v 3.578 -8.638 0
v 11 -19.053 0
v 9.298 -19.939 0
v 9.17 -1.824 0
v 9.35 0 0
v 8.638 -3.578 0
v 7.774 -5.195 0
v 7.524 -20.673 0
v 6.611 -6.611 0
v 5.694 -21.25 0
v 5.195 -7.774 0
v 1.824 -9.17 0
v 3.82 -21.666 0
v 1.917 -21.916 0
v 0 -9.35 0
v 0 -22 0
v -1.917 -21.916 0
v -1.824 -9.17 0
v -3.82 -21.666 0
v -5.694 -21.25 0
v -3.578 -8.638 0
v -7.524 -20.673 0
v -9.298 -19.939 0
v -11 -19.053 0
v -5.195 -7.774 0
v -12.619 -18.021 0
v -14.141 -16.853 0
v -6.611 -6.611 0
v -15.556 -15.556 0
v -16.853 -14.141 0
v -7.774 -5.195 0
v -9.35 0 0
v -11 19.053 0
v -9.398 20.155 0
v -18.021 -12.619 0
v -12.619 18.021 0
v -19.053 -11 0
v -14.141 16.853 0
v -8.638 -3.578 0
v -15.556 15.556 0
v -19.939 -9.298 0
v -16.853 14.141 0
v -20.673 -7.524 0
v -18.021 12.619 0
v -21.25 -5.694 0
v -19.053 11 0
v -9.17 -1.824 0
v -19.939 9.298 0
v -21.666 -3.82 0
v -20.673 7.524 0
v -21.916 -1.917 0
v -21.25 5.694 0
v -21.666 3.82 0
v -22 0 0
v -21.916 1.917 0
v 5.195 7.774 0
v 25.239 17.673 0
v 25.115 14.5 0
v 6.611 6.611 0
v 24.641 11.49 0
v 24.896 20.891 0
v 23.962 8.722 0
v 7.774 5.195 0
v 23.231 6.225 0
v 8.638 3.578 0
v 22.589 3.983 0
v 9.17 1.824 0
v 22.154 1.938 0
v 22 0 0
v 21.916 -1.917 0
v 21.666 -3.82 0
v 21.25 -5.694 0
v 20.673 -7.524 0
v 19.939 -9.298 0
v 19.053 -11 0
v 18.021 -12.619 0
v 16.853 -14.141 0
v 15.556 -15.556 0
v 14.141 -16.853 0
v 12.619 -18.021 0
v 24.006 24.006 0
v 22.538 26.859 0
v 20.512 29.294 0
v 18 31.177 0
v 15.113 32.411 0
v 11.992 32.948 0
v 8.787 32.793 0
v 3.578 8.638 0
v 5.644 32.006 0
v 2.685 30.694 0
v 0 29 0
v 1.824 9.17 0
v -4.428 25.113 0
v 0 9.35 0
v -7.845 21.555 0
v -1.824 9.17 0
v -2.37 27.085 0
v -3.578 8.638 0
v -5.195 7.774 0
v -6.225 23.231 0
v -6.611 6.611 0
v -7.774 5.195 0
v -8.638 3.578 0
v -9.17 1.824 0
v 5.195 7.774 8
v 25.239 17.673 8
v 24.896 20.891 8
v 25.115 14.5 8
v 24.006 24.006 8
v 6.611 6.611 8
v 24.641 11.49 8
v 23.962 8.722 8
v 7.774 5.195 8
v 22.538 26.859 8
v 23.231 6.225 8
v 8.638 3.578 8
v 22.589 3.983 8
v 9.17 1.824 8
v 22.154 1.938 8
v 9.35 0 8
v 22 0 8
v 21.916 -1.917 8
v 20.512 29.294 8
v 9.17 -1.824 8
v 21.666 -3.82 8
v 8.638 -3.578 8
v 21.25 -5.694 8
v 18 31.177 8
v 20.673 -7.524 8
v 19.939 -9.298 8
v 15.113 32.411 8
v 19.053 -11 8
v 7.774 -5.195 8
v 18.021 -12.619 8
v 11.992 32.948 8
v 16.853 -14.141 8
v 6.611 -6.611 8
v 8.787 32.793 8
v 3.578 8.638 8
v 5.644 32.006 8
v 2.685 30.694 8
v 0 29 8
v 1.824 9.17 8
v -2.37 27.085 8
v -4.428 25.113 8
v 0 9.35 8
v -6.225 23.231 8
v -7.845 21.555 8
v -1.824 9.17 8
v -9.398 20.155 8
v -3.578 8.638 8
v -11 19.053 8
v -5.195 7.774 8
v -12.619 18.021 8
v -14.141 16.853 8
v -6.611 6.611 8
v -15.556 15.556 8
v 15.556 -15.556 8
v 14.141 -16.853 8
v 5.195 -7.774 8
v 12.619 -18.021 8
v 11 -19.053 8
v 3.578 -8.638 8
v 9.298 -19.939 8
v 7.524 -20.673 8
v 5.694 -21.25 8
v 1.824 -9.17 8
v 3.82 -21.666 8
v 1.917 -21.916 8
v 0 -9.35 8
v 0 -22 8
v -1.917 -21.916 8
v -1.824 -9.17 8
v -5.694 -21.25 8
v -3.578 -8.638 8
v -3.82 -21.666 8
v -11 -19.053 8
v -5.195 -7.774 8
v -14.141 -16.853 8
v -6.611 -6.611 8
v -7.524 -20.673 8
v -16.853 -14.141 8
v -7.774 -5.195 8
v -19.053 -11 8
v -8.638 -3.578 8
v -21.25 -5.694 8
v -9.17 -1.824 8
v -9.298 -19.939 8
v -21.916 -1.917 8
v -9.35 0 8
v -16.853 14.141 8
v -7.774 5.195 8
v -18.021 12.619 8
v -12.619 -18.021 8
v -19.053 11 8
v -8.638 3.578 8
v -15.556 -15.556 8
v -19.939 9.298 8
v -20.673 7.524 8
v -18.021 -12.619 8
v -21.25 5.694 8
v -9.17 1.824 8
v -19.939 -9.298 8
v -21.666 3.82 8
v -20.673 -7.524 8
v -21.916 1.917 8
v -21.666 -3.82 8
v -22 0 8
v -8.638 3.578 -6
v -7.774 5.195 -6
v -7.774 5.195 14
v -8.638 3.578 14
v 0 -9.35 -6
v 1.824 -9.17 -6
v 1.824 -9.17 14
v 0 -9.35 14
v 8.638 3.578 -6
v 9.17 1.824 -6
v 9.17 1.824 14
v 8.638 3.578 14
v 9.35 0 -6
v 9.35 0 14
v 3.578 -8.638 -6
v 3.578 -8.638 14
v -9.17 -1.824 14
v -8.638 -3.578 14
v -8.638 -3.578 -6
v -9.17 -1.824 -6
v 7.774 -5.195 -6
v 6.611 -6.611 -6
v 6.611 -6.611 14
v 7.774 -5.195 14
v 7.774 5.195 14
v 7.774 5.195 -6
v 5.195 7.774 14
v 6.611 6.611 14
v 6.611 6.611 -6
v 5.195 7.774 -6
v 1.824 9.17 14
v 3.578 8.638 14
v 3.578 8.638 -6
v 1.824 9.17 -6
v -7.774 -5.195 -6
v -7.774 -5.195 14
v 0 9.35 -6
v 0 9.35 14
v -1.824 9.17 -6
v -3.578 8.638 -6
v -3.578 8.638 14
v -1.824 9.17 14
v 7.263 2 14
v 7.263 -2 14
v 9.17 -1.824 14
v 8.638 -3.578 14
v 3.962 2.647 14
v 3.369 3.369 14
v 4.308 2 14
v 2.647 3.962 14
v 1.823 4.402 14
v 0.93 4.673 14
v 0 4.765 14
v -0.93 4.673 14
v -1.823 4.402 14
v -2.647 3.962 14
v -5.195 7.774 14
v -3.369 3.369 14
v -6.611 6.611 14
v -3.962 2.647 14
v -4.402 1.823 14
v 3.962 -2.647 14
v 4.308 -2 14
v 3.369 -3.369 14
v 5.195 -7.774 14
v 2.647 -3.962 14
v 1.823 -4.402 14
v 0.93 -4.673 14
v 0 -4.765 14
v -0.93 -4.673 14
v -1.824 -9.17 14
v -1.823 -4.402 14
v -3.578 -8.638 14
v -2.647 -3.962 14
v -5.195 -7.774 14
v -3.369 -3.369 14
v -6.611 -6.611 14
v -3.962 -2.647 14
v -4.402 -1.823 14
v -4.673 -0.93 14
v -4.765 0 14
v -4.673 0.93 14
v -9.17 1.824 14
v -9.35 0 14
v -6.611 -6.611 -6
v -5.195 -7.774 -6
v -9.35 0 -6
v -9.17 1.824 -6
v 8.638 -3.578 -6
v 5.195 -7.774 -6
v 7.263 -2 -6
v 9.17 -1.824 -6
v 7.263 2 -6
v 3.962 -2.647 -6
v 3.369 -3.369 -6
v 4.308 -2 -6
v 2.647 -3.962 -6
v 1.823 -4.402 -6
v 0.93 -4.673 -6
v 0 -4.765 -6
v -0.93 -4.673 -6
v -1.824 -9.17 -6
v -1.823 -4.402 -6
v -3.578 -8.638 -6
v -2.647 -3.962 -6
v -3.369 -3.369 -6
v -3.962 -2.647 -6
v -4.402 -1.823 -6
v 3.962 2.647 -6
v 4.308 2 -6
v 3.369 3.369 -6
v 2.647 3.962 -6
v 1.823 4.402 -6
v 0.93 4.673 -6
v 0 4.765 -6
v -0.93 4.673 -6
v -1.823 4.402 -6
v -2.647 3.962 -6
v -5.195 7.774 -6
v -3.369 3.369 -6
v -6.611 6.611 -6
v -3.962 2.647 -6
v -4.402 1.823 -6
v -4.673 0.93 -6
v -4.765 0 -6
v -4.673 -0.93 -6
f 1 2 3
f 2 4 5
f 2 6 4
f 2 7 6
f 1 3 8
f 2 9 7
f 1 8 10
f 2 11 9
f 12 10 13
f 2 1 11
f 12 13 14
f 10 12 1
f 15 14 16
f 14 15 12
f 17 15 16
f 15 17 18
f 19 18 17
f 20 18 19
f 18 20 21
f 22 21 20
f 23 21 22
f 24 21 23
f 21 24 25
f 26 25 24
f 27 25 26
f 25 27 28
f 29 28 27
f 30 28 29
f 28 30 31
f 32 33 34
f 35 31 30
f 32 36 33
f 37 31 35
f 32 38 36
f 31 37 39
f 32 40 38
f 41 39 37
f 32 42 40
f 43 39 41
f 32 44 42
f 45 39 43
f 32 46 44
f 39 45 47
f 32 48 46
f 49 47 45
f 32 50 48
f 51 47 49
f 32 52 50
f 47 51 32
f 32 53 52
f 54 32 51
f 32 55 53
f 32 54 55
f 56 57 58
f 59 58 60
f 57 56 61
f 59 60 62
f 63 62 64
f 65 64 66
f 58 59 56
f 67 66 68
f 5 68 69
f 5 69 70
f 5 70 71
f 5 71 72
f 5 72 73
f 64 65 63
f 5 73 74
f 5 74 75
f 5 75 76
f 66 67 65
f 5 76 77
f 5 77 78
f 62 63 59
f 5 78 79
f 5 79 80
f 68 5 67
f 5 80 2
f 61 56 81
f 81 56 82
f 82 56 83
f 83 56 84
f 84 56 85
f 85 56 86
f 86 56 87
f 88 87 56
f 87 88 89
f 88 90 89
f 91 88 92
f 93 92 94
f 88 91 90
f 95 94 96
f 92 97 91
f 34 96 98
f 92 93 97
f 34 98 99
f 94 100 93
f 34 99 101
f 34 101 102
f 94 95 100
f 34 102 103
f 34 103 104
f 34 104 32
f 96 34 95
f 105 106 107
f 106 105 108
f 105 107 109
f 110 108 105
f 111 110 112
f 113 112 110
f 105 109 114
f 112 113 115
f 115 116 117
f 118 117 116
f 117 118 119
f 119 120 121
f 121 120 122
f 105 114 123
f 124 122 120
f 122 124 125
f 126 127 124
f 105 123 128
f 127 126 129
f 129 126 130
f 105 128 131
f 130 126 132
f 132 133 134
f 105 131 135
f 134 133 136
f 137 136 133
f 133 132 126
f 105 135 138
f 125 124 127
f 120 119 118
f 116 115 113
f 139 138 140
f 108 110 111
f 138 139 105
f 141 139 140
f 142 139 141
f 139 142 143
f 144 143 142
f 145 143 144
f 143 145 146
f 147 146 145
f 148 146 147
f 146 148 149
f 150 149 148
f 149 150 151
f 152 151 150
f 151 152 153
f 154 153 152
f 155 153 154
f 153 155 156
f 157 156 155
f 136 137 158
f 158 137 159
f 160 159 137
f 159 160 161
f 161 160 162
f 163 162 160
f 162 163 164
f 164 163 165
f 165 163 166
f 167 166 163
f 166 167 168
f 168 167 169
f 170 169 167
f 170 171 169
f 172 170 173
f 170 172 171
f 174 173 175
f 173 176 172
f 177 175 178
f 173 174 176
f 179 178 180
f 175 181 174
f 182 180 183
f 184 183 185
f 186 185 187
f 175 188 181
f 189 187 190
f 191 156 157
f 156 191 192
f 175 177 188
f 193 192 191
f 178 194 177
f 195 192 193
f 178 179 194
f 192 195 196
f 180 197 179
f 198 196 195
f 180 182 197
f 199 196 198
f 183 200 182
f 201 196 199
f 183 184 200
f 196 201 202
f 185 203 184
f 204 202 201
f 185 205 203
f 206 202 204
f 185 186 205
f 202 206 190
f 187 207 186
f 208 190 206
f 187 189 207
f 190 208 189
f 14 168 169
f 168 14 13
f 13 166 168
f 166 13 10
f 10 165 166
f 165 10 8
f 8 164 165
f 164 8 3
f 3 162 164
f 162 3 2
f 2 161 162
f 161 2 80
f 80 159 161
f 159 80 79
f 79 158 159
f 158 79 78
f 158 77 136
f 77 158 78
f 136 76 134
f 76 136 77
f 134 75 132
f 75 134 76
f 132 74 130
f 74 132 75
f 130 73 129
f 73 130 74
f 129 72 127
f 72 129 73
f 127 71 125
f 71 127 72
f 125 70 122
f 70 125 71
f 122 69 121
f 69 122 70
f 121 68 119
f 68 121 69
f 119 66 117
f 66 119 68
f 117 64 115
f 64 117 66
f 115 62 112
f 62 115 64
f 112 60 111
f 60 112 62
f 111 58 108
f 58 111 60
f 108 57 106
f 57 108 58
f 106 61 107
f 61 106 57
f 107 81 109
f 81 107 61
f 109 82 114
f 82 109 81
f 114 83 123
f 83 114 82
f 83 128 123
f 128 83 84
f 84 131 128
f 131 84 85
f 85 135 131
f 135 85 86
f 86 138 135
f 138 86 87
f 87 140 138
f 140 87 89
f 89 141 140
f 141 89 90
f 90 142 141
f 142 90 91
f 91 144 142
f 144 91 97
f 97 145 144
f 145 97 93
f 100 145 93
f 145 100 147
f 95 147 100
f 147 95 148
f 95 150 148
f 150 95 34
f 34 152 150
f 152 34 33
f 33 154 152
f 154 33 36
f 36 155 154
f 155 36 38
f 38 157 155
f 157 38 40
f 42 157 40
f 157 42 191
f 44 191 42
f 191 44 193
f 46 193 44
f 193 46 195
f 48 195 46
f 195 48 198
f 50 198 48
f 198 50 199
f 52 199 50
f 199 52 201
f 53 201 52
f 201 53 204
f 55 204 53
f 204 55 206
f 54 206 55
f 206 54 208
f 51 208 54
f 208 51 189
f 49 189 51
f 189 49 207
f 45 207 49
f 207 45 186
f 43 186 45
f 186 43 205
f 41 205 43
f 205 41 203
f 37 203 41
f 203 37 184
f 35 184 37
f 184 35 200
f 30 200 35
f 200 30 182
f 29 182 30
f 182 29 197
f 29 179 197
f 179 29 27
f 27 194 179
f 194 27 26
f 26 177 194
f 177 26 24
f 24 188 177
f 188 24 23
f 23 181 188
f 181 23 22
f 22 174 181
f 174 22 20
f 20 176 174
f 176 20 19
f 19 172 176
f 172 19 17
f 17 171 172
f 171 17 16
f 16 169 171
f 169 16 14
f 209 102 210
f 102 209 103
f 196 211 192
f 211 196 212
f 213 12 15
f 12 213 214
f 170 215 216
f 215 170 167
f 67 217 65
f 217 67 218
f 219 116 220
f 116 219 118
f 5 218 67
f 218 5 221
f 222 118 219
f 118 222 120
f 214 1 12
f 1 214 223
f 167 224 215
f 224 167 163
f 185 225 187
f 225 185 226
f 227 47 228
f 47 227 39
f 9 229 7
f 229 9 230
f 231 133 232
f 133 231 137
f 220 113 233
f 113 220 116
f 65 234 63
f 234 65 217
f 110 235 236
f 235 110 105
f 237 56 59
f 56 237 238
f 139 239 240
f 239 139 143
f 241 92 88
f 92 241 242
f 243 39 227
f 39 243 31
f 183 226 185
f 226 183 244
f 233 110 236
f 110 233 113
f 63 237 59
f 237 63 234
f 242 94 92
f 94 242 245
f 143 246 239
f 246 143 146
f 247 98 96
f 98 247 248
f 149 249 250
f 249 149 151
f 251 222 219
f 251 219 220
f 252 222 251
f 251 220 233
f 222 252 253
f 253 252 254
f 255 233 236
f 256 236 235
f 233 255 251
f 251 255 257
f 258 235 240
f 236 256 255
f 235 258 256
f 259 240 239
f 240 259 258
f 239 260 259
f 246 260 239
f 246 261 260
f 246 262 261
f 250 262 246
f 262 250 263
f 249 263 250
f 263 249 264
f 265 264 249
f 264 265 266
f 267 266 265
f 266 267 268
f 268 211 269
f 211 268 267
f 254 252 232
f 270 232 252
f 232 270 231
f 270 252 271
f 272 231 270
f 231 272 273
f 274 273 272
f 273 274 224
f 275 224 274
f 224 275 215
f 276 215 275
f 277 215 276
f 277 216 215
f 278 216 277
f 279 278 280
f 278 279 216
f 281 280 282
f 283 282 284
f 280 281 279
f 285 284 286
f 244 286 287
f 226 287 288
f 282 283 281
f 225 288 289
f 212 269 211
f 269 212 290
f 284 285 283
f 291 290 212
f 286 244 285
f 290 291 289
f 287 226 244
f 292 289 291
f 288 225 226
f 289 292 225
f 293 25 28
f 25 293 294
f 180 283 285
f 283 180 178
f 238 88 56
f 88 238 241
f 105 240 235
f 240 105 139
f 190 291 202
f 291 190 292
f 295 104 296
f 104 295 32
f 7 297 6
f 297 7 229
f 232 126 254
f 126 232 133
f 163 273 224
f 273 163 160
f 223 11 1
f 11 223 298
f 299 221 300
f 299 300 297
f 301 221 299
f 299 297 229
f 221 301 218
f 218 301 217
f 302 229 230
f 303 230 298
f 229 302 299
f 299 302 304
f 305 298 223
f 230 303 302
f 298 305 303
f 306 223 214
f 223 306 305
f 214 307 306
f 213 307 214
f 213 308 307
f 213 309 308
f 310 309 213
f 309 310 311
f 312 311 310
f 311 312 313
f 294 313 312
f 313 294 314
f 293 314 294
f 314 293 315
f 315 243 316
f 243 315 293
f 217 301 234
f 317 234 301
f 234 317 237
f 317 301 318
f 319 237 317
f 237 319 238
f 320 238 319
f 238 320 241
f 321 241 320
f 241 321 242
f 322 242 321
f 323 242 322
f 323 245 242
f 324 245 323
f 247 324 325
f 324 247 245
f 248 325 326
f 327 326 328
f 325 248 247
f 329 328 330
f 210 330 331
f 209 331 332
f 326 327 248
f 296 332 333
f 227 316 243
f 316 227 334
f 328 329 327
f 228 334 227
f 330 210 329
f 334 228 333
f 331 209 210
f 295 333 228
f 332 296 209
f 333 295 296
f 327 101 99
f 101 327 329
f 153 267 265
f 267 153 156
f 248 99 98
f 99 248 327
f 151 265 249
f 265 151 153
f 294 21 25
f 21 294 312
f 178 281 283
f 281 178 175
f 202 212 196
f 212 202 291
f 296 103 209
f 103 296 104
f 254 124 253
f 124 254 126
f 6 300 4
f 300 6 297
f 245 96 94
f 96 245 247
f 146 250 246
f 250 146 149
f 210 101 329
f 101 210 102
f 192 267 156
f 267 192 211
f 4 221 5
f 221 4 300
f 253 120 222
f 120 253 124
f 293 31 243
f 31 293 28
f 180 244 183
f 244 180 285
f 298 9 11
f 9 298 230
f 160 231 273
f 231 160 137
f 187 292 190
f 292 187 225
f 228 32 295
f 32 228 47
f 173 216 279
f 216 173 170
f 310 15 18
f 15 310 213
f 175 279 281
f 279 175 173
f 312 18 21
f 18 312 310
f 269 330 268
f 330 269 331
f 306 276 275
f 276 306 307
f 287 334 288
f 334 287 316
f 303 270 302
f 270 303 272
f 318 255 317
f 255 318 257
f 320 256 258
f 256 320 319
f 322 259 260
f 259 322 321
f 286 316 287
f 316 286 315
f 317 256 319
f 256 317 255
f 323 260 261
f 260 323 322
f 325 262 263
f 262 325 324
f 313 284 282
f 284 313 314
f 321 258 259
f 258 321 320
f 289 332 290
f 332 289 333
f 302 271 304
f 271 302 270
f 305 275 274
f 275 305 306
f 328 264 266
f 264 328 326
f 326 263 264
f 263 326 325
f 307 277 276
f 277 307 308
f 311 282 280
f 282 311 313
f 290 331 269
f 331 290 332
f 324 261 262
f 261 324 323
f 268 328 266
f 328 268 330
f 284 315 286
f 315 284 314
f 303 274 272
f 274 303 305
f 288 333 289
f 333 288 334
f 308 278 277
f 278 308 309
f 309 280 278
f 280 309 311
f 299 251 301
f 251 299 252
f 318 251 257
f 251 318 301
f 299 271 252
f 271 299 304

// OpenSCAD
$fn = 32;

// ----------------------------------------------------------------------
// Cam: base radius 22 mm with a 14 mm lift over 120 degrees
// ----------------------------------------------------------------------

// --- parameters (mm) ---
base_r = 22;              // base radius
lift = 14;                // lift height above the base radius
lift_span = 120;          // angular width of the lift
lift_start = 0;           // angle where the lift starts
cam_t = 8;                // cam plate thickness
hub_d = 18.7;             // hub diameter
hub_h = 20;               // hub height
bore_d = 9.53;            // bore
key_w = 4;                // keyway width
key_depth = 2;            // keyway depth

cam_profile = [[22, 0], [22.154, 1.938], [22.589, 3.983], [23.231, 6.225], [23.962, 8.722], [24.641, 11.49], [25.115, 14.5], [25.239, 17.673], [24.896, 20.891], [24.006, 24.006], [22.538, 26.859], [20.512, 29.294], [18, 31.177], [15.113, 32.411], [11.992, 32.948], [8.787, 32.793], [5.644, 32.006], [2.685, 30.694], [0, 29], [-2.37, 27.085], [-4.428, 25.113], [-6.225, 23.231], [-7.845, 21.555], [-9.398, 20.155], [-11, 19.053], [-12.619, 18.021], [-14.141, 16.853], [-15.556, 15.556], [-16.853, 14.141], [-18.021, 12.619], [-19.053, 11], [-19.939, 9.298], [-20.673, 7.524], [-21.25, 5.694], [-21.666, 3.82], [-21.916, 1.917], [-22, 0], [-21.916, -1.917], [-21.666, -3.82], [-21.25, -5.694], [-20.673, -7.524], [-19.939, -9.298], [-19.053, -11], [-18.021, -12.619], [-16.853, -14.141], [-15.556, -15.556], [-14.141, -16.853], [-12.619, -18.021], [-11, -19.053], [-9.298, -19.939], [-7.524, -20.673], [-5.694, -21.25], [-3.82, -21.666], [-1.917, -21.916], [0, -22], [1.917, -21.916], [3.82, -21.666], [5.694, -21.25], [7.524, -20.673], [9.298, -19.939], [11, -19.053], [12.619, -18.021], [14.141, -16.853], [15.556, -15.556], [16.853, -14.141], [18.021, -12.619], [19.053, -11], [19.939, -9.298], [20.673, -7.524], [21.25, -5.694], [21.666, -3.82], [21.916, -1.917]];

difference() {
  union() {
    linear_extrude(height = cam_t) polygon(cam_profile);
    /* hub, proud of the cam plate on both sides */
    translate([0, 0, -6]) cylinder(h = hub_h, d = hub_d);
  }
  /* bore through the hub, 2.5 mm clear on both faces */
  translate([0, 0, -8.5]) cylinder(h = hub_h + 5, d = bore_d);
  /* keyway, milled through the whole hub */
  translate([2.763, -2, -8.5]) cube([4.5, 4, 25]);
}
